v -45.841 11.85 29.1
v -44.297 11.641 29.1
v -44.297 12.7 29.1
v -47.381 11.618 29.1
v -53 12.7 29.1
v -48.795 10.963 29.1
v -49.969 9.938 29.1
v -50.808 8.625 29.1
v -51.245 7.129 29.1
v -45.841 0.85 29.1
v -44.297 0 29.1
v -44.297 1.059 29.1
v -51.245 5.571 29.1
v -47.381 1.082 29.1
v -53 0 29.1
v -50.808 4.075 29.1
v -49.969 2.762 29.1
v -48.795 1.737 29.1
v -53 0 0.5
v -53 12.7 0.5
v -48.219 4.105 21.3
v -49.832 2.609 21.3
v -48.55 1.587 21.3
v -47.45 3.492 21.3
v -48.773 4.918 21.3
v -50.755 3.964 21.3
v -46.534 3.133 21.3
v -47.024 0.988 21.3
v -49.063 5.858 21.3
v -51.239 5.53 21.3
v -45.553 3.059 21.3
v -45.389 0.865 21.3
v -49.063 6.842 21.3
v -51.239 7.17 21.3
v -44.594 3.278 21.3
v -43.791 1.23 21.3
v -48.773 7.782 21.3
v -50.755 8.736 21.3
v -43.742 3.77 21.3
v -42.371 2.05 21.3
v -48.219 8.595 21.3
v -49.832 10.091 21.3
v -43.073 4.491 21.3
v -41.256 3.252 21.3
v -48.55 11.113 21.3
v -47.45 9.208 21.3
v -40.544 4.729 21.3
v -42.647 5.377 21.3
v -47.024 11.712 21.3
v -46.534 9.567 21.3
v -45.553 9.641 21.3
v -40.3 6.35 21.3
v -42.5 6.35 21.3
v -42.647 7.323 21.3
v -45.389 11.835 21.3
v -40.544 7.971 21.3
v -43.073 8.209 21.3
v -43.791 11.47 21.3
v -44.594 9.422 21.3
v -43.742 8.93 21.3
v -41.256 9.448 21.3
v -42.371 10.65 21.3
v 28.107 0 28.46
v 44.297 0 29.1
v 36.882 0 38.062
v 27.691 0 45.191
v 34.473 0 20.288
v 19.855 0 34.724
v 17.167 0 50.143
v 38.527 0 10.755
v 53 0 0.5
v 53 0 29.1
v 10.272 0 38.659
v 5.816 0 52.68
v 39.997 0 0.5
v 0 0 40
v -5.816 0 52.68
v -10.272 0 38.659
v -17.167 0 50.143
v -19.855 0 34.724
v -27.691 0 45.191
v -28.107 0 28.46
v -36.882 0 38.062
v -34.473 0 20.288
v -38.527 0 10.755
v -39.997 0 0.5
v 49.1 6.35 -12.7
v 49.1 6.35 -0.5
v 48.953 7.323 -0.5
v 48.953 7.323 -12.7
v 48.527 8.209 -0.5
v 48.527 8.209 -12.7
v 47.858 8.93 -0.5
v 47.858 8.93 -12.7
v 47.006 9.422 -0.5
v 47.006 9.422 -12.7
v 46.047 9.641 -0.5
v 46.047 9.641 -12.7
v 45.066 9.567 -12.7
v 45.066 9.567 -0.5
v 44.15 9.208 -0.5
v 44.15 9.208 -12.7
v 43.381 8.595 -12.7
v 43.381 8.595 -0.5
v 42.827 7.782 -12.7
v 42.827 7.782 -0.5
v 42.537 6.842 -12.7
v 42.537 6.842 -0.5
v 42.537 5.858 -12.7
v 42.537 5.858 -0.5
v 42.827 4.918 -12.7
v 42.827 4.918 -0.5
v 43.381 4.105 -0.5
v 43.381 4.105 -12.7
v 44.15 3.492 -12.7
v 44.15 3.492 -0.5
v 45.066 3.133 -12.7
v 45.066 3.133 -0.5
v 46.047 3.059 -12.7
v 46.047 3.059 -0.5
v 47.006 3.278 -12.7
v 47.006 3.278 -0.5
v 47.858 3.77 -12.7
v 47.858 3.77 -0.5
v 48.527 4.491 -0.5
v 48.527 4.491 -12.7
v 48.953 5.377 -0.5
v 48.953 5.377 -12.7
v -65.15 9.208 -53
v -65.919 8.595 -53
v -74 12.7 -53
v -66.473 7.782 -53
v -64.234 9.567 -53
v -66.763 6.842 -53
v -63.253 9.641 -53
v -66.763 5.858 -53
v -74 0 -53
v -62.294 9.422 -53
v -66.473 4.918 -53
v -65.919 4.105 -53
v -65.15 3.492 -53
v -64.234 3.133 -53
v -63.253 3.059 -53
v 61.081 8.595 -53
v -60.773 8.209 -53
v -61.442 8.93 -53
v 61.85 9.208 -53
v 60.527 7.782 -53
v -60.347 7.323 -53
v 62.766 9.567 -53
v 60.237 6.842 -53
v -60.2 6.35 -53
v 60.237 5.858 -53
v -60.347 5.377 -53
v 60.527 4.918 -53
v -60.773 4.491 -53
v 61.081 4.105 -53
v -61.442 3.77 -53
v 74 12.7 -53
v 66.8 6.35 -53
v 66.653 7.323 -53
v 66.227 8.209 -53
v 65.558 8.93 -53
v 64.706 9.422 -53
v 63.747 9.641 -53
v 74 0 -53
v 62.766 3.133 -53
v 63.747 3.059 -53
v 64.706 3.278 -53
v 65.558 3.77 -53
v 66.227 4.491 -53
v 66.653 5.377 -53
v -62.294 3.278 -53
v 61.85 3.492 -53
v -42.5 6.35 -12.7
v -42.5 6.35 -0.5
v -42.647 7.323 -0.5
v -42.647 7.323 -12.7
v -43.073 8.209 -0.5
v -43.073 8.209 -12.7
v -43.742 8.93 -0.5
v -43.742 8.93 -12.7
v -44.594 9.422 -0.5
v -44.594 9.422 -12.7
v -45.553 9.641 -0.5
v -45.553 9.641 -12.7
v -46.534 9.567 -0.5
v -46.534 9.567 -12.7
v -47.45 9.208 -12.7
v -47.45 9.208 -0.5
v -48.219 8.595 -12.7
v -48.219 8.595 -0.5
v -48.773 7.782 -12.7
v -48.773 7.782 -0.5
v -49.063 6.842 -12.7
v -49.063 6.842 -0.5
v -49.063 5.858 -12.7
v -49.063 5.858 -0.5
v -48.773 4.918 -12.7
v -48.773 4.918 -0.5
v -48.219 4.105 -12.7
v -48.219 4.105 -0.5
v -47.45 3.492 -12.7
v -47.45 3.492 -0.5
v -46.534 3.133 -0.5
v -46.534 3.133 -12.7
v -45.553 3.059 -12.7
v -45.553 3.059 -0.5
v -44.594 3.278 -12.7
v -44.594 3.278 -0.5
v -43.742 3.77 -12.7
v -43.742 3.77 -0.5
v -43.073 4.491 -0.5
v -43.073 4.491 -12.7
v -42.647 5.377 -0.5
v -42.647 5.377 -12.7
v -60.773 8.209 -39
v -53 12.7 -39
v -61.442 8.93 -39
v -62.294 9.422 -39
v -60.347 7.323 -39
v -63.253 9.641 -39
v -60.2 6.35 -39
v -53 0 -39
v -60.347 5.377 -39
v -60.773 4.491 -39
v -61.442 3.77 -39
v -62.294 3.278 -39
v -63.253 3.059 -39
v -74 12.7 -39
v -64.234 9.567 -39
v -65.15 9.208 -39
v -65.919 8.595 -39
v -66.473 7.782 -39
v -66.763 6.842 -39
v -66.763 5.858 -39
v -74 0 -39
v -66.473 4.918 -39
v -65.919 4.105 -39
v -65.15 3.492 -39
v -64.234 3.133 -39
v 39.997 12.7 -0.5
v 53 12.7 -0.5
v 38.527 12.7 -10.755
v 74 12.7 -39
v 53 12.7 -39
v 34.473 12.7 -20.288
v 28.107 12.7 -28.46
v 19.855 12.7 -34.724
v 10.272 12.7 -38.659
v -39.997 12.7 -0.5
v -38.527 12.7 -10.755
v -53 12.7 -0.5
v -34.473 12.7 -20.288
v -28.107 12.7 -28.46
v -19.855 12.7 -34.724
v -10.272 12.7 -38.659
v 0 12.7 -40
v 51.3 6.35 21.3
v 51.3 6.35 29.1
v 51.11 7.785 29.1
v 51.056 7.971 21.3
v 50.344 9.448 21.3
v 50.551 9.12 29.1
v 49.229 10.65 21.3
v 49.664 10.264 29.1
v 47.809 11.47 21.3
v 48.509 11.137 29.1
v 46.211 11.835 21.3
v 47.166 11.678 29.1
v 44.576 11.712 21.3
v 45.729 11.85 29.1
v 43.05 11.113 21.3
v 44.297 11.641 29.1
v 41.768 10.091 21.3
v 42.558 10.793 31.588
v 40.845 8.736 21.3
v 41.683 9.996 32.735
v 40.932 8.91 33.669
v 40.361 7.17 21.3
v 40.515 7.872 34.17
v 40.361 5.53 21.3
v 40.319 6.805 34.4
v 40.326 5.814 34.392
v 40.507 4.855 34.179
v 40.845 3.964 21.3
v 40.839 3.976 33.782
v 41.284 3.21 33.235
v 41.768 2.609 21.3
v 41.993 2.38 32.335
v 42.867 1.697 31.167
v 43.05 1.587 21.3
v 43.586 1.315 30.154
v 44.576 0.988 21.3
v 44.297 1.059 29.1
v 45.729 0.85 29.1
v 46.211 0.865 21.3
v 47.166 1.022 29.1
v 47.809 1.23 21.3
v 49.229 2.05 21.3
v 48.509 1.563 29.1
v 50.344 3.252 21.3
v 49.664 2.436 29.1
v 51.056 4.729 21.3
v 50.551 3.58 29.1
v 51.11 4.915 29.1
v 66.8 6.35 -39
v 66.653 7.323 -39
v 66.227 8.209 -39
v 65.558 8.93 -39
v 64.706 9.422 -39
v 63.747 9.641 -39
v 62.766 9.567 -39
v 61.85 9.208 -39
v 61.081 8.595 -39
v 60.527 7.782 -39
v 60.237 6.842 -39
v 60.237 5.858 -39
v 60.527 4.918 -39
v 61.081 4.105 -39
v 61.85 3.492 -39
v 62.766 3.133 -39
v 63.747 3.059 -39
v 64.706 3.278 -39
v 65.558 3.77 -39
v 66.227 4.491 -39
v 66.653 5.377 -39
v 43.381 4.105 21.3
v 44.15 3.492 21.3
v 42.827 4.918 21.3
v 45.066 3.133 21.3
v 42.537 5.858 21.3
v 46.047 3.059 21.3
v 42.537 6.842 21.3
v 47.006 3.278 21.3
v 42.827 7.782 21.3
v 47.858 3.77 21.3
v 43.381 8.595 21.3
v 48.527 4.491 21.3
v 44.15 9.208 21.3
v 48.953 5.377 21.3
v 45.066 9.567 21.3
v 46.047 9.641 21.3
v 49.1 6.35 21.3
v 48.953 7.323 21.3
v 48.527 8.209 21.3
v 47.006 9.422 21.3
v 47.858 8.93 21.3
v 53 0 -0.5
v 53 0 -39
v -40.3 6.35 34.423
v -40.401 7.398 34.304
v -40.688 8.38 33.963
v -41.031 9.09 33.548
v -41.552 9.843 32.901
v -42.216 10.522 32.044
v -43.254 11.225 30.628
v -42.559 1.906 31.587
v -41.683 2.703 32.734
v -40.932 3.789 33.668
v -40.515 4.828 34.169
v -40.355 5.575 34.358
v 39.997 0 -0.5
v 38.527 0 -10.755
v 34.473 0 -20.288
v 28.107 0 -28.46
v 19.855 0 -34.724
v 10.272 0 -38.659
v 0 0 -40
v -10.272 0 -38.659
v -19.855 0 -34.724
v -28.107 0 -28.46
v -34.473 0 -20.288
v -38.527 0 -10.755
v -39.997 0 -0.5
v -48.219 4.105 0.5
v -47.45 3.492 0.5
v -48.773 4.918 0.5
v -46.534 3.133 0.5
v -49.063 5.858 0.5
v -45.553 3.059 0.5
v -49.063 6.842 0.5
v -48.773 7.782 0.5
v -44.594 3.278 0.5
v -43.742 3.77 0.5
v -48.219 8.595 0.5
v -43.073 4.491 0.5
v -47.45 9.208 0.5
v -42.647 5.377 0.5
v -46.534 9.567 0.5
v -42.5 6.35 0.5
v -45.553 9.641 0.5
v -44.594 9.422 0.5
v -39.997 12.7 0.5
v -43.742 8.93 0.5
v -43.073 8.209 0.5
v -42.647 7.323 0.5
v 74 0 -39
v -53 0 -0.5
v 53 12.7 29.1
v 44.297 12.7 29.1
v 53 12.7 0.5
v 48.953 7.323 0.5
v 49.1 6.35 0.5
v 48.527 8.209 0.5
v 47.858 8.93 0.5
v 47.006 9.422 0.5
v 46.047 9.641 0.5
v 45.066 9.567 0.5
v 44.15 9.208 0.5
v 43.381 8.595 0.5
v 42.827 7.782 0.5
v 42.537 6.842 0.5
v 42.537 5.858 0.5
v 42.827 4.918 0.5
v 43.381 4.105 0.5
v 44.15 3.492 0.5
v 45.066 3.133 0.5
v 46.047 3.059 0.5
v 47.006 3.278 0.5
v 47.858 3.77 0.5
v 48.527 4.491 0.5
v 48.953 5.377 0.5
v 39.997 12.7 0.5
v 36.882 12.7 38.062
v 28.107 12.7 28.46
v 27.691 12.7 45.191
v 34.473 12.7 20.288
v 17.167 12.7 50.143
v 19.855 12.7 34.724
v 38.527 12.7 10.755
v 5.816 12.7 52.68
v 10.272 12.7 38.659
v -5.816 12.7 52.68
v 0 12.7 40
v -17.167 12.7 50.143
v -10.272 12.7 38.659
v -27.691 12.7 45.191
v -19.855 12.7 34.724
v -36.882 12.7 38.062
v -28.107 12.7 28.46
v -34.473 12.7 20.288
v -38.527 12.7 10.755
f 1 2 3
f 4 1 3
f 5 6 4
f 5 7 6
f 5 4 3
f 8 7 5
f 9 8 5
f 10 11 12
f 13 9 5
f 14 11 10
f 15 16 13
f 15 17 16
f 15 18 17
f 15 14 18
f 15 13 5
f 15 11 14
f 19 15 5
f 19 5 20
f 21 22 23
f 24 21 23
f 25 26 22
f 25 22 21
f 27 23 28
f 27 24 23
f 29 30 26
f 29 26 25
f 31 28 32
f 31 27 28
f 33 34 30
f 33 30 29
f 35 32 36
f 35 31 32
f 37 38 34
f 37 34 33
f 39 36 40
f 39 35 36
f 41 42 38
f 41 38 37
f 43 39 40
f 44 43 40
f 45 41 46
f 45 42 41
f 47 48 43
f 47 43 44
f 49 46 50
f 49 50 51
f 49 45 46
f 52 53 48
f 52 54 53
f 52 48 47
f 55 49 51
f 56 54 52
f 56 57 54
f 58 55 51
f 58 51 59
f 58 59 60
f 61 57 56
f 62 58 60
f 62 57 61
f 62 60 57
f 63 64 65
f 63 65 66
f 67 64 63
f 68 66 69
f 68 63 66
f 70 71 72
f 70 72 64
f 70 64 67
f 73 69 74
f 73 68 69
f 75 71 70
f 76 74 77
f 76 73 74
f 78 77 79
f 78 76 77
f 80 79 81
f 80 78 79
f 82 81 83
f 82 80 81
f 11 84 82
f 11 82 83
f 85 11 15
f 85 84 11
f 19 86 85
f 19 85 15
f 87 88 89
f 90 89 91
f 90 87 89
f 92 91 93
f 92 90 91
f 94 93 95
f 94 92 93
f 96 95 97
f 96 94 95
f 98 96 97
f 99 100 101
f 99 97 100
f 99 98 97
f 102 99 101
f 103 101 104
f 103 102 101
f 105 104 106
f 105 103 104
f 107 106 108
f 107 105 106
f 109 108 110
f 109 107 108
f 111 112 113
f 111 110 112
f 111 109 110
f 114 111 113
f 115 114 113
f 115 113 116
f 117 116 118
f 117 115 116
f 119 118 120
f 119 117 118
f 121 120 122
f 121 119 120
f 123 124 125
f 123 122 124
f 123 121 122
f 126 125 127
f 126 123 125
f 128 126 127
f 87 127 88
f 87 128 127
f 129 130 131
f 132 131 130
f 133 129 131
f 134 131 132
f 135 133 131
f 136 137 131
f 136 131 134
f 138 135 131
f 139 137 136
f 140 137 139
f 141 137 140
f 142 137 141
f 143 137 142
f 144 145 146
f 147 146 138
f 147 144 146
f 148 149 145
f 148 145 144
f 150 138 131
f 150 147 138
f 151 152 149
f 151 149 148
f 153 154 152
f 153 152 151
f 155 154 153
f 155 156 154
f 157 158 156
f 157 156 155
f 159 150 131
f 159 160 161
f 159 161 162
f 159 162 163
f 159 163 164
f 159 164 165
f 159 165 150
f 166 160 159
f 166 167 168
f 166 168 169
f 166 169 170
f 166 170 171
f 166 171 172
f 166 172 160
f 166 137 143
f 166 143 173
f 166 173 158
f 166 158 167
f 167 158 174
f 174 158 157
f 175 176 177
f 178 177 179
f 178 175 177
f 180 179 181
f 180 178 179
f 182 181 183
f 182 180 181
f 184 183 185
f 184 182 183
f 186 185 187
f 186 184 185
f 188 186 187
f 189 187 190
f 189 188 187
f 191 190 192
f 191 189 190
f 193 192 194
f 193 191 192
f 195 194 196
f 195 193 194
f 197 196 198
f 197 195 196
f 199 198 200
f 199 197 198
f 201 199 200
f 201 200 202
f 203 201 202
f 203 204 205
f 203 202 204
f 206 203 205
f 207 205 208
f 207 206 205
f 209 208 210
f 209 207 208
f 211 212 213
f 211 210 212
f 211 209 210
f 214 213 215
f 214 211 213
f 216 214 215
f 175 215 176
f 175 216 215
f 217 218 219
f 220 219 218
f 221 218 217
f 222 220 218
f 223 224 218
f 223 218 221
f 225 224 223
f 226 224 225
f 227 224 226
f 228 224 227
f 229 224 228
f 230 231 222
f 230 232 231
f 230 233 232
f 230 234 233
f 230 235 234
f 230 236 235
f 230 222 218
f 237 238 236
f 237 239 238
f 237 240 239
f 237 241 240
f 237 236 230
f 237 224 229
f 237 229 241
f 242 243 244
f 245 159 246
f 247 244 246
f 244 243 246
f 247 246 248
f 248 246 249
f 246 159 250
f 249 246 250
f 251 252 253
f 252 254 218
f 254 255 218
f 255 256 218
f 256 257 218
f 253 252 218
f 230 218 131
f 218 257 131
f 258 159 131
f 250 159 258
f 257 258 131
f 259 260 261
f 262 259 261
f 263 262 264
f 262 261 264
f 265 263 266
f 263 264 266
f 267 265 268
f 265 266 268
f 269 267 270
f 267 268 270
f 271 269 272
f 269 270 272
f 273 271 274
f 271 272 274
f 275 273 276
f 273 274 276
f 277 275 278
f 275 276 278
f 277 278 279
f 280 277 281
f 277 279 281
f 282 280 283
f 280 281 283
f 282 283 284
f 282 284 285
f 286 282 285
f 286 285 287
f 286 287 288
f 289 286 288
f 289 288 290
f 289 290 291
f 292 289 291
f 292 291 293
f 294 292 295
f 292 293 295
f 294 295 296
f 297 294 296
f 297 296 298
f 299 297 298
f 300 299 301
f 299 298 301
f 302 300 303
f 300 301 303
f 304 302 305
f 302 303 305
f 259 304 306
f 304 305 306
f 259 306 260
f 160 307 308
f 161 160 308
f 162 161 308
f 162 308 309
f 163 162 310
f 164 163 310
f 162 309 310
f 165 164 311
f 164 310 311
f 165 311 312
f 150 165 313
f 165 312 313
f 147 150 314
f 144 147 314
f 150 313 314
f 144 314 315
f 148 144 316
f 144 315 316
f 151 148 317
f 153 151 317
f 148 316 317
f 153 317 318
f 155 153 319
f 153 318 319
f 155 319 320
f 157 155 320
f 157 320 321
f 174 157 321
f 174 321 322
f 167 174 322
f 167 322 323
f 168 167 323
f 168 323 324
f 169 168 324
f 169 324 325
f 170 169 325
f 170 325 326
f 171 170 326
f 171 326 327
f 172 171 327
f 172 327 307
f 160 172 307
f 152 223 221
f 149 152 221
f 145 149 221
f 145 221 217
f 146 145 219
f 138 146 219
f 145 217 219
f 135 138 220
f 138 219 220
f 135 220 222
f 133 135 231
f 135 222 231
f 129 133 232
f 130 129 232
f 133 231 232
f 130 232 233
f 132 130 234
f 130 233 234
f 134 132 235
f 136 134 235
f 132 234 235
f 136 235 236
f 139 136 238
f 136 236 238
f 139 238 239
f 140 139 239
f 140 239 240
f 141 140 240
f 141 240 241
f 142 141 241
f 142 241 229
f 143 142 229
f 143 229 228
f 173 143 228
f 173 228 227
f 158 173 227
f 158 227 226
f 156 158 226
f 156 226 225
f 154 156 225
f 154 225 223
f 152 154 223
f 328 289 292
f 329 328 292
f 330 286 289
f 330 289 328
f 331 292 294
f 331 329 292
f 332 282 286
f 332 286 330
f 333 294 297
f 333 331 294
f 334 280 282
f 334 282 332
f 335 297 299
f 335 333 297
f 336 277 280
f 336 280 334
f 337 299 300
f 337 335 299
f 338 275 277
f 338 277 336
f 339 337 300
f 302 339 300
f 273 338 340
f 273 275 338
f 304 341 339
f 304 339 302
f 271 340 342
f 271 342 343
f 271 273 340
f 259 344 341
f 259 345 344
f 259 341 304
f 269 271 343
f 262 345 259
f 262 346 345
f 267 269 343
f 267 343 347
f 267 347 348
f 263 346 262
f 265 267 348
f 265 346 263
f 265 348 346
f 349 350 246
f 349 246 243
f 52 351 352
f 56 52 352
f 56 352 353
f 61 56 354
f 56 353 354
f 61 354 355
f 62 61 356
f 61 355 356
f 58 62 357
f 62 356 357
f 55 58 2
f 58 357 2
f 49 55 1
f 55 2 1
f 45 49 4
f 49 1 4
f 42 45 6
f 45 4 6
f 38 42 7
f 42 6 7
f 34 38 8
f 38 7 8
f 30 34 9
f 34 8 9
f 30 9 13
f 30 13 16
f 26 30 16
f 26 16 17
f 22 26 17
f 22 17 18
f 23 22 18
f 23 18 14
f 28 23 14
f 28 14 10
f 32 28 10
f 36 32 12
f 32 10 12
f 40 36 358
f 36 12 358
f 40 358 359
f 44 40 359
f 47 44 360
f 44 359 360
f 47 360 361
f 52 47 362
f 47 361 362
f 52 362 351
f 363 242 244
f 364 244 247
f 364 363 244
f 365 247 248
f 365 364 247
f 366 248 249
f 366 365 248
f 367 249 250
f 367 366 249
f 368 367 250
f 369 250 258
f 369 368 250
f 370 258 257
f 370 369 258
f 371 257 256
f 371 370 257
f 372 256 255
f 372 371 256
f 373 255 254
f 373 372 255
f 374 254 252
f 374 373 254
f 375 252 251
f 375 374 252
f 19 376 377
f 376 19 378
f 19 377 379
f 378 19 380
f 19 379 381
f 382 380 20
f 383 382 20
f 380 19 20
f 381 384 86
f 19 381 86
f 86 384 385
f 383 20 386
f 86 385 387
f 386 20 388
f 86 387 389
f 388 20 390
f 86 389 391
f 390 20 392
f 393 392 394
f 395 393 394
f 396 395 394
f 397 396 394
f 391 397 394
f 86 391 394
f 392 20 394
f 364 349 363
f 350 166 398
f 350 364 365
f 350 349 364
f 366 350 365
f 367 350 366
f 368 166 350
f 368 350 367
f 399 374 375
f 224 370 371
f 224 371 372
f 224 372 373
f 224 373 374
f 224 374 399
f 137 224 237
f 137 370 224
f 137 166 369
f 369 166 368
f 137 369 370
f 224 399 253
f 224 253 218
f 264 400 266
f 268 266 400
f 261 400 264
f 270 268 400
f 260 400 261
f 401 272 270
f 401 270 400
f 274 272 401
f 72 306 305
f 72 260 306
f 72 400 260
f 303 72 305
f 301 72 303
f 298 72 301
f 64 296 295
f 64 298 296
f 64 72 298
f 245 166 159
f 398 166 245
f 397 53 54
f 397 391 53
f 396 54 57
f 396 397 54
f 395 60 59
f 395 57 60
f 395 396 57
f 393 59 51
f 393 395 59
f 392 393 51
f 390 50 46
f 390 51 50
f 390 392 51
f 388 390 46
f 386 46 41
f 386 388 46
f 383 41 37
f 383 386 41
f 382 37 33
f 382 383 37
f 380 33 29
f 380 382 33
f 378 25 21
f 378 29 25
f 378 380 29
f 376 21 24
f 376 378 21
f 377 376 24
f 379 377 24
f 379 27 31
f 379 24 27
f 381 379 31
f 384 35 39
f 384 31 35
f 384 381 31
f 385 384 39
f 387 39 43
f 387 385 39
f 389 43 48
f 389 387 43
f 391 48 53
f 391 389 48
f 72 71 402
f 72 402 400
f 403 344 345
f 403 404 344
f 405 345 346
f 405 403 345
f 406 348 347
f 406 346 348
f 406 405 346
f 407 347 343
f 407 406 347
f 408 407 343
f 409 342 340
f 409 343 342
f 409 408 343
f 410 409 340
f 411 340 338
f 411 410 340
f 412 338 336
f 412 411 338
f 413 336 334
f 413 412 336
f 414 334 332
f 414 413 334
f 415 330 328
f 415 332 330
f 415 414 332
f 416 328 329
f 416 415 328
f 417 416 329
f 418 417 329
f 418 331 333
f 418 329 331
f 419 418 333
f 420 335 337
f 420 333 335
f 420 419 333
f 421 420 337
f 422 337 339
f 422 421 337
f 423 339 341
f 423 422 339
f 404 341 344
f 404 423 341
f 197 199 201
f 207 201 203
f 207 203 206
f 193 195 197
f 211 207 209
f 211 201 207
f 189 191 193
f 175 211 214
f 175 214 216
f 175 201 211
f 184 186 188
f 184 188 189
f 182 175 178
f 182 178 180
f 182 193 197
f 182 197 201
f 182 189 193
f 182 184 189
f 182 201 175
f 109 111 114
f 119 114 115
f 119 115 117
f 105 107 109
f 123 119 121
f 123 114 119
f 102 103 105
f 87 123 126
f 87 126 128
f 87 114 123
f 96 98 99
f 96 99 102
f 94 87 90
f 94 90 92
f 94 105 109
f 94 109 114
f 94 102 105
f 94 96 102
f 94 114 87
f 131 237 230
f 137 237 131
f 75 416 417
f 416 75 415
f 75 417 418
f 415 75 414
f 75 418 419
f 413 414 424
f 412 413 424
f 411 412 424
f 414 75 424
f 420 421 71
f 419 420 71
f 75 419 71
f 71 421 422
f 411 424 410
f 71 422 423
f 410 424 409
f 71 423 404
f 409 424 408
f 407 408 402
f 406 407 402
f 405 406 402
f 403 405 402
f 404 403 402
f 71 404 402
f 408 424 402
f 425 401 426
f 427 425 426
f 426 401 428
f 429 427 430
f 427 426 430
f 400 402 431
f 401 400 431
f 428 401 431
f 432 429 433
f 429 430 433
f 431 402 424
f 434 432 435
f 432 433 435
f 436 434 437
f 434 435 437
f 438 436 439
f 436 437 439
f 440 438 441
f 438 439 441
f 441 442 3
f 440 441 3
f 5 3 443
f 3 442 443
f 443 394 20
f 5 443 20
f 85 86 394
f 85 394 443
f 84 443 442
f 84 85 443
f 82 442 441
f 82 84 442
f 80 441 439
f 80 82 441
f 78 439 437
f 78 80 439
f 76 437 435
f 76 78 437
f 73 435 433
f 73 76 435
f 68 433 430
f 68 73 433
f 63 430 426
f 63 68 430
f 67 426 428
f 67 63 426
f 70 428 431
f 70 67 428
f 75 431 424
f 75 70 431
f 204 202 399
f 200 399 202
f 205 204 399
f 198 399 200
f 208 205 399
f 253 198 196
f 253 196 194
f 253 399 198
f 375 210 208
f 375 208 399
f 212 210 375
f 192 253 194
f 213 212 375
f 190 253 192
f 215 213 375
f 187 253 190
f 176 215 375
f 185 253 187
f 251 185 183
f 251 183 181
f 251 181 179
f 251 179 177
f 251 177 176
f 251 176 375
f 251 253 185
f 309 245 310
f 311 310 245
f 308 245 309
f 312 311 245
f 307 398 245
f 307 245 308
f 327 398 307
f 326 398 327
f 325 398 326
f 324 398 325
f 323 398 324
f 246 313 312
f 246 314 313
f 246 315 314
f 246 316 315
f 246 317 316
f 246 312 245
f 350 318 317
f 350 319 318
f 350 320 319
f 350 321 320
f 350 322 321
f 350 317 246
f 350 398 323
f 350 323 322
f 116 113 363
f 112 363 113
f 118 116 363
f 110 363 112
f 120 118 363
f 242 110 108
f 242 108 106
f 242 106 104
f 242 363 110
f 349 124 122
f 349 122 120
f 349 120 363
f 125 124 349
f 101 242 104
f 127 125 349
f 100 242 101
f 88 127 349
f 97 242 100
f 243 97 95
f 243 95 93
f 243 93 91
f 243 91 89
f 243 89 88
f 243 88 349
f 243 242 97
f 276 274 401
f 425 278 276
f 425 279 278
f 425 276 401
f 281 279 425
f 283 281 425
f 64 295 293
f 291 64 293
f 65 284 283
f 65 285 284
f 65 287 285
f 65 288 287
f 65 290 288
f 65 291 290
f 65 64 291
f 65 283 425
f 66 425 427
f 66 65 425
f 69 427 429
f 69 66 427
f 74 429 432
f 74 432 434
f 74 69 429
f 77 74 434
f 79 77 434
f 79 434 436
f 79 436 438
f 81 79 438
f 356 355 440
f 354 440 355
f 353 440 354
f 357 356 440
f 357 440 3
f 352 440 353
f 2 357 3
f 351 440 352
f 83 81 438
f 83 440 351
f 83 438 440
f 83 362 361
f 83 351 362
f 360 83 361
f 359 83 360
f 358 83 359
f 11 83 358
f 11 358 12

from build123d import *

# Parameters (mm, degrees)
SKETCH1_R               = 40
BOSS_EXTRUDE1_DEPTH     = 12.7
SKETCH3_R               = 3.3
CUT_EXTRUDE2_DEPTH      = 15
SKETCH4_R               = 3.3
CUT_EXTRUDE3_DEPTH      = 72.7
CUT_EXTRUDE3_DEPTH_BACK = 12.7
SKETCH2_W               = 153.705760516
SKETCH2_H               = 1
CUT_EXTRUDE1_DEPTH      = 1.0000001
CUT_EXTRUDE1_DEPTH_BACK = 13.7000001
CUT_EXTRUDE4_START      = 40
SKETCH5_R               = 5.5
CUT_EXTRUDE4_DEPTH      = 18.7


with BuildPart() as part:
    # Sketch1 → Boss-Extrude1 (new body)
    with BuildSketch(Plane(origin=(0, 0, 0), x_dir=(1, 0, 0), z_dir=(0, 1, 0))):
        with BuildLine():
            Line((-74, 53), (74, 53))
            Line((74, 53), (74, 39))
            Line((74, 39), (53, 39))
            Line((53, 39), (53, 0))
            Line((53, 0), (53, -29.1))
            Line((53, -29.1), (44.296613866, -29.1))
            ThreePointArc((44.296613866, -29.1), (0, -53), (-44.296613866, -29.1))
            Line((-44.296613866, -29.1), (-53, -29.1))
            Line((-53, -29.1), (-53, 0))
            Line((-53, 0), (-53, 39))
            Line((-53, 39), (-74, 39))
            Line((-74, 39), (-74, 53))
        make_face()
        Circle(SKETCH1_R, mode=Mode.SUBTRACT)
    extrude(amount=BOSS_EXTRUDE1_DEPTH)

    # Sketch3 → Cut-Extrude2 (cut, through all)
    with BuildSketch(Plane.XY.offset(-39)):
        with Locations((-63.5, 6.35)):
            Circle(SKETCH3_R)
        with Locations((63.5, 6.35)):
            Circle(SKETCH3_R)
    extrude(amount=-CUT_EXTRUDE2_DEPTH, mode=Mode.SUBTRACT)

    # Sketch4 → Cut-Extrude3 (cut, two sides)
    with BuildSketch(Plane.XY) as cut_extrude3_sk:
        with Locations((45.8, 6.35)):
            Circle(SKETCH4_R)
        with Locations((-45.8, 6.35)):
            Circle(SKETCH4_R)
    extrude(amount=CUT_EXTRUDE3_DEPTH, mode=Mode.SUBTRACT)
    extrude(cut_extrude3_sk.sketch, amount=-CUT_EXTRUDE3_DEPTH_BACK, mode=Mode.SUBTRACT)

    # Sketch2 → Cut-Extrude1 (cut, two sides)
    with BuildSketch(Plane(origin=(0, 12.7, 0), x_dir=(1, 0, 0), z_dir=(0, 1, 0))) as cut_extrude1_sk:
        Rectangle(SKETCH2_W, SKETCH2_H)
    extrude(amount=CUT_EXTRUDE1_DEPTH, mode=Mode.SUBTRACT)
    extrude(cut_extrude1_sk.sketch, amount=-CUT_EXTRUDE1_DEPTH_BACK, mode=Mode.SUBTRACT)

    # Sketch5 → Cut-Extrude4 (cut)
    with BuildSketch(Plane.XY.offset(CUT_EXTRUDE4_START)):
        with Locations((45.8, 6.35)):
            Circle(SKETCH5_R)
        with Locations((-45.8, 6.35)):
            Circle(SKETCH5_R)
    extrude(amount=-CUT_EXTRUDE4_DEPTH, mode=Mode.SUBTRACT)


solid = part.part
